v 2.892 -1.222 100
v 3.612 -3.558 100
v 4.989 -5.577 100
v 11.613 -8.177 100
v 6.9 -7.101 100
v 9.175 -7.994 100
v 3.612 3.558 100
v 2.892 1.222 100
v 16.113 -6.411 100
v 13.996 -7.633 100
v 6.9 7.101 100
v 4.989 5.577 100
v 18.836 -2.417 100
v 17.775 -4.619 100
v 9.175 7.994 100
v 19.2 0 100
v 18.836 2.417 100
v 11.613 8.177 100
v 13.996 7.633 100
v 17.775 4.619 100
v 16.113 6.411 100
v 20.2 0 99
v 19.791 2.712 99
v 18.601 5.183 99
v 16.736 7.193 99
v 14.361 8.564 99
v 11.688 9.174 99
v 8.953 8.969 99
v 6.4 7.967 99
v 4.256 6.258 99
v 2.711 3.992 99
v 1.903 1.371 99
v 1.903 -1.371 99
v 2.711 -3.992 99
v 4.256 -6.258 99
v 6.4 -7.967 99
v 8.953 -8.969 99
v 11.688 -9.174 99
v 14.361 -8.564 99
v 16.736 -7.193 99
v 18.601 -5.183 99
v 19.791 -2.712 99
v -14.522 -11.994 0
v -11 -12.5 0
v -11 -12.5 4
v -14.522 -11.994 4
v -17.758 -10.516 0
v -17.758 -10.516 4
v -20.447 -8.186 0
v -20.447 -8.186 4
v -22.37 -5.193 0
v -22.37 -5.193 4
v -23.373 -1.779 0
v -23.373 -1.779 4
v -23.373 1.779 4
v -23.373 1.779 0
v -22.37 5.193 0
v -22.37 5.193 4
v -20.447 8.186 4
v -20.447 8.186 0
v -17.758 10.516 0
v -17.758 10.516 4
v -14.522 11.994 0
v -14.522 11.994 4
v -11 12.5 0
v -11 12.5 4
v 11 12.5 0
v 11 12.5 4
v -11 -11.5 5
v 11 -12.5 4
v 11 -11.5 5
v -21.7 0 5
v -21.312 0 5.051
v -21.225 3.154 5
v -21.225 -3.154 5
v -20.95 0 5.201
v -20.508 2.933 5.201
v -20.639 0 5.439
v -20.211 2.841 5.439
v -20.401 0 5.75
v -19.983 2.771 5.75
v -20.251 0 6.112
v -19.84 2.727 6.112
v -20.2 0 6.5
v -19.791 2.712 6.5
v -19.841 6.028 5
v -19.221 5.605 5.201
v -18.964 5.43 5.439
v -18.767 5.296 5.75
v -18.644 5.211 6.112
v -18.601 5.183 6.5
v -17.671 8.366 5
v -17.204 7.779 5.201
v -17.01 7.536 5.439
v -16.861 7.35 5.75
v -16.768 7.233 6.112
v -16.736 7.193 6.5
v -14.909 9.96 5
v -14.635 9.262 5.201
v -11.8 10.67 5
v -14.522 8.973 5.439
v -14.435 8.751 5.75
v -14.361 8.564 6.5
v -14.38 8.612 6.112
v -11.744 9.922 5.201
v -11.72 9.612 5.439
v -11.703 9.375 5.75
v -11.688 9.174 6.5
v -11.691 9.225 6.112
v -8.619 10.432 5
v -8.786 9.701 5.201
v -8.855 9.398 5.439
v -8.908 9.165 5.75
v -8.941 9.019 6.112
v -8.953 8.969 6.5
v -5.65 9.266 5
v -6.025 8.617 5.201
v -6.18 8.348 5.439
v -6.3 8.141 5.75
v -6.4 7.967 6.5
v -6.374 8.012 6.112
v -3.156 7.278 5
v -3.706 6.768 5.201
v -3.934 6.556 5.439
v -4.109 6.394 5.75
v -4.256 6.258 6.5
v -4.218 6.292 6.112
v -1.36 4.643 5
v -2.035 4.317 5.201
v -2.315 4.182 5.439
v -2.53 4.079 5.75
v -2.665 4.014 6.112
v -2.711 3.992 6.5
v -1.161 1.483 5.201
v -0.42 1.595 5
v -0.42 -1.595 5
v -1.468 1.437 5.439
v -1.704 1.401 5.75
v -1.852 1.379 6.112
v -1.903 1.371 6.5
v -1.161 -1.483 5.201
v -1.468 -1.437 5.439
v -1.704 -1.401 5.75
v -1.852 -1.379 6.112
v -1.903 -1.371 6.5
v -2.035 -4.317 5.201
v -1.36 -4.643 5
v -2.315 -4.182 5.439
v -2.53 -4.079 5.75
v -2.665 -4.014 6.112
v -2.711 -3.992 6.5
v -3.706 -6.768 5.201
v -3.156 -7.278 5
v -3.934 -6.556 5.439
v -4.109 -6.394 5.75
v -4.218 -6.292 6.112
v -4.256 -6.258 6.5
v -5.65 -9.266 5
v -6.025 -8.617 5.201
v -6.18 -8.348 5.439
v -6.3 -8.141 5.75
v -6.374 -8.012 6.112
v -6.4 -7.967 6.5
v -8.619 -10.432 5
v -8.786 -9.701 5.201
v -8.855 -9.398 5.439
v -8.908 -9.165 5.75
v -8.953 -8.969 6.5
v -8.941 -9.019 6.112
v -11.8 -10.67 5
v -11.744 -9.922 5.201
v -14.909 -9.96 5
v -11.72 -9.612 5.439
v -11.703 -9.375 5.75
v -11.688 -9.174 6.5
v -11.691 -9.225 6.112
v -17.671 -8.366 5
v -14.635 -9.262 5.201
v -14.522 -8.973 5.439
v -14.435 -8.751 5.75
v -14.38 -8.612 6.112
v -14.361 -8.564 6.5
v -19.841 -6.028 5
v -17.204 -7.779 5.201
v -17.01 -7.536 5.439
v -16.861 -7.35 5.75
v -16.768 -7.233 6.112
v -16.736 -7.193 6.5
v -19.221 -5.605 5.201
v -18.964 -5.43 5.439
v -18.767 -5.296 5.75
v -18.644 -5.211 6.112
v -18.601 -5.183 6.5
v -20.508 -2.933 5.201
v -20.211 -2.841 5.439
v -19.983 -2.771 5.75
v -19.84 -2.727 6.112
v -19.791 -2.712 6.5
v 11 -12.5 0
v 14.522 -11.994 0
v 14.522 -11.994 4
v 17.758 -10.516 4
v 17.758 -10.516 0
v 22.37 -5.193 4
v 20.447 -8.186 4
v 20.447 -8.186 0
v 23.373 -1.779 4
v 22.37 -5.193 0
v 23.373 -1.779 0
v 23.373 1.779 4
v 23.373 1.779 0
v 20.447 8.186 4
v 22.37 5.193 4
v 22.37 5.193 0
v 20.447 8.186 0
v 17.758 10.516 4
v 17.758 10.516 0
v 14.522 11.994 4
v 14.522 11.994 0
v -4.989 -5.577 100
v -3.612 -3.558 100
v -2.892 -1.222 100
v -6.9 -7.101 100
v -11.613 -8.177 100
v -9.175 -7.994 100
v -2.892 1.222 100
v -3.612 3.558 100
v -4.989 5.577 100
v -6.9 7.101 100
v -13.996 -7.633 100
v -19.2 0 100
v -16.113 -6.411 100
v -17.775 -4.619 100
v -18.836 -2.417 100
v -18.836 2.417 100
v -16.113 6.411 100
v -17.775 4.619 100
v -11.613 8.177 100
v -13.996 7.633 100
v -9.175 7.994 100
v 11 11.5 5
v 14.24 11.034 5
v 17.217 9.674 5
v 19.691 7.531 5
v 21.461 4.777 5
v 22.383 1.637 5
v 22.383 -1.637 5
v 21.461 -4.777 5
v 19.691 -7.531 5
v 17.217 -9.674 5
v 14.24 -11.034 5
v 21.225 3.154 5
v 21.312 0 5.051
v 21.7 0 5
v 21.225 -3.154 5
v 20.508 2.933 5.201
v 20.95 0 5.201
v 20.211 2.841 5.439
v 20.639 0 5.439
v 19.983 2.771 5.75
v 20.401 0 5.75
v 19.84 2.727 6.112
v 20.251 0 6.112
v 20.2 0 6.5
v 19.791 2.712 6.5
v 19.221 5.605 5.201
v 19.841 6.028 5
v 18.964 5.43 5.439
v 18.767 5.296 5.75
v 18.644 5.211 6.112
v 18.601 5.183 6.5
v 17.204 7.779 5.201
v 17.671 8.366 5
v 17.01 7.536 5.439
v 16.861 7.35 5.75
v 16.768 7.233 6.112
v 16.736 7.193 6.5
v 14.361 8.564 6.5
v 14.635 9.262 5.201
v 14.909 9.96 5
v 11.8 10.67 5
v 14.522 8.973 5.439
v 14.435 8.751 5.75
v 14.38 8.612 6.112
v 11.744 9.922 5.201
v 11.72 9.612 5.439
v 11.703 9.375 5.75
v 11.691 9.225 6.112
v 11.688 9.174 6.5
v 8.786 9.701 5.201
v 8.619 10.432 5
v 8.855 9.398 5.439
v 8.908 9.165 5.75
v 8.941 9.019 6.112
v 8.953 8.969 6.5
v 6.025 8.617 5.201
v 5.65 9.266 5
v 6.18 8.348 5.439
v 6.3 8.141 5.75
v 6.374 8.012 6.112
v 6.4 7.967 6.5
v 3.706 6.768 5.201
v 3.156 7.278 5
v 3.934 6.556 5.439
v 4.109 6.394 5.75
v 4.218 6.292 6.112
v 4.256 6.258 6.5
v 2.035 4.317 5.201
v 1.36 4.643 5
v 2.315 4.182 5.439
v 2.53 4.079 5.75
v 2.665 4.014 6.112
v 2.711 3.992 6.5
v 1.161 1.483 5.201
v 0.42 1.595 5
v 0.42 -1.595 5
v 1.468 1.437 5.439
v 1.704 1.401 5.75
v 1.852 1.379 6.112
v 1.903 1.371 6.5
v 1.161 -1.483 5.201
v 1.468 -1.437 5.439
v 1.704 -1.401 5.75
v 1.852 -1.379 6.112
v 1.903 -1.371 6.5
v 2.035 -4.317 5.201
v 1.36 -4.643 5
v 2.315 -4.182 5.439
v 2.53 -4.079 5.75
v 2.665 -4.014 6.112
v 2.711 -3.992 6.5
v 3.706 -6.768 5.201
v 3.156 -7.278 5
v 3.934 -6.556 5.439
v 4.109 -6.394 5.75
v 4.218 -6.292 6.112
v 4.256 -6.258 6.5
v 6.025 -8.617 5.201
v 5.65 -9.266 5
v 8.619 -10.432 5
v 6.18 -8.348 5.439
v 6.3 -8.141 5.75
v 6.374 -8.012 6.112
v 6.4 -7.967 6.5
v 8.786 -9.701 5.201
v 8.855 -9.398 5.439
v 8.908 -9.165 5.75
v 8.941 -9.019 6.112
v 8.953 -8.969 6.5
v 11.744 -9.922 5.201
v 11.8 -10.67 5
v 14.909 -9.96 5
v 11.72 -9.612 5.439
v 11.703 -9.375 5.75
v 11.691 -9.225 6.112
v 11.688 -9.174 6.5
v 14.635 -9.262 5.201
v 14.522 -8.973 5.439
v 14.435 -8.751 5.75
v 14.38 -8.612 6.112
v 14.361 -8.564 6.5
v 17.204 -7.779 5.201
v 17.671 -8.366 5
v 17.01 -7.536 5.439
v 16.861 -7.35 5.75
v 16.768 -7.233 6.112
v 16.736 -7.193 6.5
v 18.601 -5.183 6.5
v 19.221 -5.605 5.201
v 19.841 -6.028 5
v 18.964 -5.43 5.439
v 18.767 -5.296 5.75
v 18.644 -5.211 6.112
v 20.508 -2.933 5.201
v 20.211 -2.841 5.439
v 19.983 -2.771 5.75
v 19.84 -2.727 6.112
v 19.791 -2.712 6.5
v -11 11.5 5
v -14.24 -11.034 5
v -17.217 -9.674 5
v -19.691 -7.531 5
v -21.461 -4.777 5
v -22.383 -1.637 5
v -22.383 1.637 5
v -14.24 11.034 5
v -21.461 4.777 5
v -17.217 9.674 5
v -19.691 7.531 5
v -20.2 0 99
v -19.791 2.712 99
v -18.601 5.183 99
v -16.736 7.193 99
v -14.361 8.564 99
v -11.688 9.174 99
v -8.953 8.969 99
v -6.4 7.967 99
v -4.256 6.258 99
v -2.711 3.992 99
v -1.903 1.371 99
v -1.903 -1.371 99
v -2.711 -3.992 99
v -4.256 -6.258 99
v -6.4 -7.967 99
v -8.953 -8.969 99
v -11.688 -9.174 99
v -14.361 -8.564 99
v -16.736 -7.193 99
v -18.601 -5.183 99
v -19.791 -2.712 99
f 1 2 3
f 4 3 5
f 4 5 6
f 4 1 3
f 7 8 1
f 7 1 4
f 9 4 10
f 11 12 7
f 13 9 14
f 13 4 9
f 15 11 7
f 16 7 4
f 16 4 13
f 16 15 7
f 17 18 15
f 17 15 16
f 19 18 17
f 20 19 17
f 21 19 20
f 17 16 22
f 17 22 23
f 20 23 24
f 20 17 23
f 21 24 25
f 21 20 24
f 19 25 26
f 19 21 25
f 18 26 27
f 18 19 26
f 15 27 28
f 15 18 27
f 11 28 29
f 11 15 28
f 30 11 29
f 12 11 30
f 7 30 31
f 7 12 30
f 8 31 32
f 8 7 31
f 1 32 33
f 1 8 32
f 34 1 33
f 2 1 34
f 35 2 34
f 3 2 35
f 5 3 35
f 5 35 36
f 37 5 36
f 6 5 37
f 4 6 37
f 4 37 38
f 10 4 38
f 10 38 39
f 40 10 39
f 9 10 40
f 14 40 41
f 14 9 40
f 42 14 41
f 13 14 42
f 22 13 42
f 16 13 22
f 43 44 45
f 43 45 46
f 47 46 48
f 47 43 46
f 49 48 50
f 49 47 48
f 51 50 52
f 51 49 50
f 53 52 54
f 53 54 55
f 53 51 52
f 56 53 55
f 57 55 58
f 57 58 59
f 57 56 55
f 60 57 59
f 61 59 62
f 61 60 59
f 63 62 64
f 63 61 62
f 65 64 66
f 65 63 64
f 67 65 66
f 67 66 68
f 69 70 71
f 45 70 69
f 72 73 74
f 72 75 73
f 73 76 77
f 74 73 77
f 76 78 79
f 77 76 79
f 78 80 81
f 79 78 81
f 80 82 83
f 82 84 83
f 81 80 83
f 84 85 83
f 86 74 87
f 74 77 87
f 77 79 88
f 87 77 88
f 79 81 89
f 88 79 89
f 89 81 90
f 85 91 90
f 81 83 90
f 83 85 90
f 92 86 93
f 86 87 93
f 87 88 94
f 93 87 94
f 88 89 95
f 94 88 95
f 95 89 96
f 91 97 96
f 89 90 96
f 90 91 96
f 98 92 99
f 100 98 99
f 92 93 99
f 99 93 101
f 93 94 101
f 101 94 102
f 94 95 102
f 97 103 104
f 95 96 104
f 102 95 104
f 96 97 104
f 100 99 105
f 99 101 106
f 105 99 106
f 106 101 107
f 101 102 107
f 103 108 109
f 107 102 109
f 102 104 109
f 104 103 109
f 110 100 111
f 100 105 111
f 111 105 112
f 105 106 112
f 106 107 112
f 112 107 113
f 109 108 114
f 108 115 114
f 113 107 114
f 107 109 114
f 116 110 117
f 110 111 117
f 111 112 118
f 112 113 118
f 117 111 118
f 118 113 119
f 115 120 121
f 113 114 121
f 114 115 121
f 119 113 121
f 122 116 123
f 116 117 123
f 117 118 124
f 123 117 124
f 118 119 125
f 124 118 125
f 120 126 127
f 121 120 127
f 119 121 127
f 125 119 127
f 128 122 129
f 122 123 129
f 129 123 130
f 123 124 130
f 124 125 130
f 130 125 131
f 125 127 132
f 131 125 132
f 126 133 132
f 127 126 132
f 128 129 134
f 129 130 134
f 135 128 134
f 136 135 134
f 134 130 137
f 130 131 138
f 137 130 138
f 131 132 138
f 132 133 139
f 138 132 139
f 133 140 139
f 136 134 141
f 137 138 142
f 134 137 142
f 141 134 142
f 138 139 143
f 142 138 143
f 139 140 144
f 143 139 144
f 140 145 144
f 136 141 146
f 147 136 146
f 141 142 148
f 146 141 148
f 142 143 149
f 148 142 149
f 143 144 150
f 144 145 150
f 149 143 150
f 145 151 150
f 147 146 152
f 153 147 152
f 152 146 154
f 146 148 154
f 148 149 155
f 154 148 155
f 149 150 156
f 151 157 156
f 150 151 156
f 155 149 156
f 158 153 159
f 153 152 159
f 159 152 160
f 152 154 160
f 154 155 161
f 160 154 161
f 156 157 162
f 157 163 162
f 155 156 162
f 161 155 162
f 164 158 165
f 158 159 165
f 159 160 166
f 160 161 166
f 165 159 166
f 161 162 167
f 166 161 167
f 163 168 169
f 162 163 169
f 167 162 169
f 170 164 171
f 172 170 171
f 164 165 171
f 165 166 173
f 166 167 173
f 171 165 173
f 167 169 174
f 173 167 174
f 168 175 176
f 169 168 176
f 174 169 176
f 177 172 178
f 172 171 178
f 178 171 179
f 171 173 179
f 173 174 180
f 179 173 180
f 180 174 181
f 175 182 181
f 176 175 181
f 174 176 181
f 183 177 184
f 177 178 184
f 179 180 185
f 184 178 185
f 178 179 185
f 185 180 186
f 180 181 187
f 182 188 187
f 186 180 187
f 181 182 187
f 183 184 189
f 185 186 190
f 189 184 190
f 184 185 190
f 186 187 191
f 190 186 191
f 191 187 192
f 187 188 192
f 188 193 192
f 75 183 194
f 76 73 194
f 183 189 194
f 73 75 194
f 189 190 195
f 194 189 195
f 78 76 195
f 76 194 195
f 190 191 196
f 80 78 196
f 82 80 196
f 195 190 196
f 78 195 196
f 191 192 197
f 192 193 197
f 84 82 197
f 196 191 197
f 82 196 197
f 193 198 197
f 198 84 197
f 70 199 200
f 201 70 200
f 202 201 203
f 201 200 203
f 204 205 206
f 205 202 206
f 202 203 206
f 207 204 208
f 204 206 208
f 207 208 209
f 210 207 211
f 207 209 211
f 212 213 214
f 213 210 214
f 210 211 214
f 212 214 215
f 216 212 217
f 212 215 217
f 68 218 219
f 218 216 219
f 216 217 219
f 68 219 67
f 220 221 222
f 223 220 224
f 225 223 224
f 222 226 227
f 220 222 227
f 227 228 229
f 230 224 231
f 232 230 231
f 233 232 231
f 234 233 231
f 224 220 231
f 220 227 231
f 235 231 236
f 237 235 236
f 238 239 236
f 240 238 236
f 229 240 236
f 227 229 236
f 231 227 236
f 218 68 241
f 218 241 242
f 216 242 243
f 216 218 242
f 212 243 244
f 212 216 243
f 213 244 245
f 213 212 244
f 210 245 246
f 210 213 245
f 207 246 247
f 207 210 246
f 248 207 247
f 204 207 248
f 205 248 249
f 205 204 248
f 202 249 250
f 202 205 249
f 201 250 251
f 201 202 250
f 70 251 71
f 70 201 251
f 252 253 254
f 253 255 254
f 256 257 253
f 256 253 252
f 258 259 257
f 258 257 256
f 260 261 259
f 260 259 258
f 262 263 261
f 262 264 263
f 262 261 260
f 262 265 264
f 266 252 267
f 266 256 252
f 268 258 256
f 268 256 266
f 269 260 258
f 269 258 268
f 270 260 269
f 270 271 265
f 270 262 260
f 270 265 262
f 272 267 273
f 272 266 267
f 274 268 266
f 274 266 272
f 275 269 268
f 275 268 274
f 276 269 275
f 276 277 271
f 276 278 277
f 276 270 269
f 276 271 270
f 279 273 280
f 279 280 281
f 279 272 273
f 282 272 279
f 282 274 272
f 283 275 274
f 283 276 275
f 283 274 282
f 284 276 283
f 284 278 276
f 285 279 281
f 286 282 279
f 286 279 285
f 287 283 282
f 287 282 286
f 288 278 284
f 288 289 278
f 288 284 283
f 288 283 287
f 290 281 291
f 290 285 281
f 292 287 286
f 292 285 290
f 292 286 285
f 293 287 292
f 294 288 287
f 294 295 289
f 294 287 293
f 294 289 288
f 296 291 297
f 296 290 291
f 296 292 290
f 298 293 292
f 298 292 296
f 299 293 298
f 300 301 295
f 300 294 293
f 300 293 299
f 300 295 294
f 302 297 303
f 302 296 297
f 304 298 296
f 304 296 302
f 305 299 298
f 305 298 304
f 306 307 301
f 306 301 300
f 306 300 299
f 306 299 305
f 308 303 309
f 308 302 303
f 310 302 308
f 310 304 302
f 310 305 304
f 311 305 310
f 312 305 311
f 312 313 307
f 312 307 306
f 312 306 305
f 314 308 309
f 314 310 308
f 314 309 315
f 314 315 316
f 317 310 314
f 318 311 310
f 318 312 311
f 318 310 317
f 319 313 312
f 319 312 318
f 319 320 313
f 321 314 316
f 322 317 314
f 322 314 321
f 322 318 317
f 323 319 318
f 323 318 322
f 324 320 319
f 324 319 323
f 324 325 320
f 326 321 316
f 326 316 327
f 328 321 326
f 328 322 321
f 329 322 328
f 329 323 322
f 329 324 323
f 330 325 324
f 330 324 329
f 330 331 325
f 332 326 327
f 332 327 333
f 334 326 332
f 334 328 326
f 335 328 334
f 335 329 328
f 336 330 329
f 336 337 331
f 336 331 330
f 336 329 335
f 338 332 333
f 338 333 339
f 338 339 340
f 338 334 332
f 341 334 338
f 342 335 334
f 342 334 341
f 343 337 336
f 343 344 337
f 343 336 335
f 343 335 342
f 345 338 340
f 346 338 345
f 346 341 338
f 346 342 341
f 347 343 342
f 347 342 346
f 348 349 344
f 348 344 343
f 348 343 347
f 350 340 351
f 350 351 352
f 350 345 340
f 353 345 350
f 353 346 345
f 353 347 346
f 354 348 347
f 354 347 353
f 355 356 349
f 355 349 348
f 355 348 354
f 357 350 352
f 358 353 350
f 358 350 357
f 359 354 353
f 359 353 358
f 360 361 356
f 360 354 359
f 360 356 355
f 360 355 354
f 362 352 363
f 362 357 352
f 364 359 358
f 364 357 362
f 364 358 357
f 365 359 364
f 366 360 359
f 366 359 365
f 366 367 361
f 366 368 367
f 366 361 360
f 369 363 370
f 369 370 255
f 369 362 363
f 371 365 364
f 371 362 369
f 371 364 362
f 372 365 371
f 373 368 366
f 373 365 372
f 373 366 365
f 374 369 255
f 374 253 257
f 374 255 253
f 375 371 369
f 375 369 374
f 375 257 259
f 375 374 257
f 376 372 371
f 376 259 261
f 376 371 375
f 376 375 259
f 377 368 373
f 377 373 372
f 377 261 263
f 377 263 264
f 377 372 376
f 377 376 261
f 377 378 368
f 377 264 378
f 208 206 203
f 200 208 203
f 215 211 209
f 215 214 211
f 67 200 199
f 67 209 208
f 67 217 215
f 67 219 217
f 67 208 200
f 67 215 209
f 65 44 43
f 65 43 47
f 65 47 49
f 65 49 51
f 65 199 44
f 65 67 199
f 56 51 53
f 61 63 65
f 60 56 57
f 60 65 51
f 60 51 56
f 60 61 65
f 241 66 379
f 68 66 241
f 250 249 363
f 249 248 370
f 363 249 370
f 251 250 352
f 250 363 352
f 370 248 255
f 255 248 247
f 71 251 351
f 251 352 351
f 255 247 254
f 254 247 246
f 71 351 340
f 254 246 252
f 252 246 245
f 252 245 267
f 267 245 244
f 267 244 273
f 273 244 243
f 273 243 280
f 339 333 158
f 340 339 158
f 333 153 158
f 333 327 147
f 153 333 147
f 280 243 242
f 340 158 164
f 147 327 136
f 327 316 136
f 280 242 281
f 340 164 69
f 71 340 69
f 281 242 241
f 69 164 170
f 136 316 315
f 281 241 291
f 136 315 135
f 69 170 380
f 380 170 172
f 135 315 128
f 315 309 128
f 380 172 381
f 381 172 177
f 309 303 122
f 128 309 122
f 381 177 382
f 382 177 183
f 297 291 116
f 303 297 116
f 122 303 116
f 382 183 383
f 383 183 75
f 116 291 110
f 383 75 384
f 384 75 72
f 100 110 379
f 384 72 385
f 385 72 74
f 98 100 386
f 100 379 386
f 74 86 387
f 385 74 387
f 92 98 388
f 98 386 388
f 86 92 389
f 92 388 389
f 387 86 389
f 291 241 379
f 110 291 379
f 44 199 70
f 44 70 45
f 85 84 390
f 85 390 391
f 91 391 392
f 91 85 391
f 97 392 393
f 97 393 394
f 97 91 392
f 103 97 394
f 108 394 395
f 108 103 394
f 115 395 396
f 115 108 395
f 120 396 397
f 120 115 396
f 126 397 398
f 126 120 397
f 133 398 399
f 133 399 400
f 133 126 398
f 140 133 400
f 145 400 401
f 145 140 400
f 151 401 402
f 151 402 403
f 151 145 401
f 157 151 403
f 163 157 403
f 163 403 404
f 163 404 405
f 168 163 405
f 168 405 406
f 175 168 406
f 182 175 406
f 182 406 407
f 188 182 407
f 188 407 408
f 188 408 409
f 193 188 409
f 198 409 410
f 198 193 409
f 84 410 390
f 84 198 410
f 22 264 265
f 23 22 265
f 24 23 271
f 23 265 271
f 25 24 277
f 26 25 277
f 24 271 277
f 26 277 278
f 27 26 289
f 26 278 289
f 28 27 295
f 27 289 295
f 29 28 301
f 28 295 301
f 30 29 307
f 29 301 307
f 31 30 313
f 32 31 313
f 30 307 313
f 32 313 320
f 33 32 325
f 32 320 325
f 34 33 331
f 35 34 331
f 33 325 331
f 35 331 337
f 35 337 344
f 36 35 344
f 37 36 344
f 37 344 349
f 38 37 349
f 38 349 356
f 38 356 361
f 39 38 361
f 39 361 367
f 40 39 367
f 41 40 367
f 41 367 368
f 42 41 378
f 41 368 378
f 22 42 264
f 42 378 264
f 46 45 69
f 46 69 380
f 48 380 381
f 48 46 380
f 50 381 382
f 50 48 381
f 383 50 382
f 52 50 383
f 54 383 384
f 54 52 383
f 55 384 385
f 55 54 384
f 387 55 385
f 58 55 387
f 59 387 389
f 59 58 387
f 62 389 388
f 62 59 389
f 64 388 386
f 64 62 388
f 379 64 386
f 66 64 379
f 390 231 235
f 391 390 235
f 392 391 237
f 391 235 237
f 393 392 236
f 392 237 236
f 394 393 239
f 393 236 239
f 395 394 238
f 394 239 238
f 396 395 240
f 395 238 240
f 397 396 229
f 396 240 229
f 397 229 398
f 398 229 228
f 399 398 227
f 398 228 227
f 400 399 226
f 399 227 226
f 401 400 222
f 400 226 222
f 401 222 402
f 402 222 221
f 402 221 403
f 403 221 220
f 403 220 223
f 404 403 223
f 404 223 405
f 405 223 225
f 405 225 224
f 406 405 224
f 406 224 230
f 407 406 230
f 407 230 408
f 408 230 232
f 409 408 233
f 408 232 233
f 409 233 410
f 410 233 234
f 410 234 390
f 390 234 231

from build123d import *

# Parameters (mm, degrees)
PAD_DEPTH       = 5
SKETCH001_R     = 9.2
PAD001_DEPTH    = 95
FILLET_R        = 1.5
CHAMFER_SIZE    = 1
CHAMFER001_SIZE = 1


with BuildPart() as part:
    # Sketch → Pad (new body)
    with BuildSketch(Plane.XY):
        with BuildLine():
            ThreePointArc((11, -12.5), (23.5, 0), (11, 12.5))
            Line((11, 12.5), (0, 12.5))
            Line((0, 12.5), (0, -12.5))
            Line((0, -12.5), (11, -12.5))
        make_face()
    pad = extrude(amount=PAD_DEPTH)

    # Mirrored: Pad across Sketch V_Axis
    add(pad.mirror(Plane(origin=(0, 0, 0), x_dir=(0, 0, 1), z_dir=(1, 0, 0))))

    # Sketch001 (on Face5 of Mirrored) → Pad001 (join)
    with BuildSketch(Plane.XY.offset(5)):
        with Locations((11, 0)):
            Circle(SKETCH001_R)
    pad001 = extrude(amount=PAD001_DEPTH)

    # Mirrored001: Pad001 across Sketch001 V_Axis
    add(pad001.mirror(Plane(origin=(0, 0, 5), x_dir=(0, 0, 1), z_dir=(1, 0, 0))))

    # Fillet
    fillet_edges = [part.edges().sort_by_distance(p)[0] for p in [
        (-1.8, 0, 5),
        (1.8, 0, 5),
    ]]
    fillet(fillet_edges, radius=FILLET_R)

    # Chamfer
    chamfer_edges = [part.edges().sort_by_distance(p)[0] for p in [
        (-23.5, 0, 5),
        (0, -12.5, 5),
        (23.5, 0, 5),
        (0, 12.5, 5),
    ]]
    chamfer(chamfer_edges, length=CHAMFER_SIZE)

    # Chamfer001
    chamfer001_edges = [part.edges().sort_by_distance(p)[0] for p in [
        (-1.8, 0, 100),
        (1.8, 0, 100),
    ]]
    chamfer(chamfer001_edges, length=CHAMFER001_SIZE)


solid = part.part
